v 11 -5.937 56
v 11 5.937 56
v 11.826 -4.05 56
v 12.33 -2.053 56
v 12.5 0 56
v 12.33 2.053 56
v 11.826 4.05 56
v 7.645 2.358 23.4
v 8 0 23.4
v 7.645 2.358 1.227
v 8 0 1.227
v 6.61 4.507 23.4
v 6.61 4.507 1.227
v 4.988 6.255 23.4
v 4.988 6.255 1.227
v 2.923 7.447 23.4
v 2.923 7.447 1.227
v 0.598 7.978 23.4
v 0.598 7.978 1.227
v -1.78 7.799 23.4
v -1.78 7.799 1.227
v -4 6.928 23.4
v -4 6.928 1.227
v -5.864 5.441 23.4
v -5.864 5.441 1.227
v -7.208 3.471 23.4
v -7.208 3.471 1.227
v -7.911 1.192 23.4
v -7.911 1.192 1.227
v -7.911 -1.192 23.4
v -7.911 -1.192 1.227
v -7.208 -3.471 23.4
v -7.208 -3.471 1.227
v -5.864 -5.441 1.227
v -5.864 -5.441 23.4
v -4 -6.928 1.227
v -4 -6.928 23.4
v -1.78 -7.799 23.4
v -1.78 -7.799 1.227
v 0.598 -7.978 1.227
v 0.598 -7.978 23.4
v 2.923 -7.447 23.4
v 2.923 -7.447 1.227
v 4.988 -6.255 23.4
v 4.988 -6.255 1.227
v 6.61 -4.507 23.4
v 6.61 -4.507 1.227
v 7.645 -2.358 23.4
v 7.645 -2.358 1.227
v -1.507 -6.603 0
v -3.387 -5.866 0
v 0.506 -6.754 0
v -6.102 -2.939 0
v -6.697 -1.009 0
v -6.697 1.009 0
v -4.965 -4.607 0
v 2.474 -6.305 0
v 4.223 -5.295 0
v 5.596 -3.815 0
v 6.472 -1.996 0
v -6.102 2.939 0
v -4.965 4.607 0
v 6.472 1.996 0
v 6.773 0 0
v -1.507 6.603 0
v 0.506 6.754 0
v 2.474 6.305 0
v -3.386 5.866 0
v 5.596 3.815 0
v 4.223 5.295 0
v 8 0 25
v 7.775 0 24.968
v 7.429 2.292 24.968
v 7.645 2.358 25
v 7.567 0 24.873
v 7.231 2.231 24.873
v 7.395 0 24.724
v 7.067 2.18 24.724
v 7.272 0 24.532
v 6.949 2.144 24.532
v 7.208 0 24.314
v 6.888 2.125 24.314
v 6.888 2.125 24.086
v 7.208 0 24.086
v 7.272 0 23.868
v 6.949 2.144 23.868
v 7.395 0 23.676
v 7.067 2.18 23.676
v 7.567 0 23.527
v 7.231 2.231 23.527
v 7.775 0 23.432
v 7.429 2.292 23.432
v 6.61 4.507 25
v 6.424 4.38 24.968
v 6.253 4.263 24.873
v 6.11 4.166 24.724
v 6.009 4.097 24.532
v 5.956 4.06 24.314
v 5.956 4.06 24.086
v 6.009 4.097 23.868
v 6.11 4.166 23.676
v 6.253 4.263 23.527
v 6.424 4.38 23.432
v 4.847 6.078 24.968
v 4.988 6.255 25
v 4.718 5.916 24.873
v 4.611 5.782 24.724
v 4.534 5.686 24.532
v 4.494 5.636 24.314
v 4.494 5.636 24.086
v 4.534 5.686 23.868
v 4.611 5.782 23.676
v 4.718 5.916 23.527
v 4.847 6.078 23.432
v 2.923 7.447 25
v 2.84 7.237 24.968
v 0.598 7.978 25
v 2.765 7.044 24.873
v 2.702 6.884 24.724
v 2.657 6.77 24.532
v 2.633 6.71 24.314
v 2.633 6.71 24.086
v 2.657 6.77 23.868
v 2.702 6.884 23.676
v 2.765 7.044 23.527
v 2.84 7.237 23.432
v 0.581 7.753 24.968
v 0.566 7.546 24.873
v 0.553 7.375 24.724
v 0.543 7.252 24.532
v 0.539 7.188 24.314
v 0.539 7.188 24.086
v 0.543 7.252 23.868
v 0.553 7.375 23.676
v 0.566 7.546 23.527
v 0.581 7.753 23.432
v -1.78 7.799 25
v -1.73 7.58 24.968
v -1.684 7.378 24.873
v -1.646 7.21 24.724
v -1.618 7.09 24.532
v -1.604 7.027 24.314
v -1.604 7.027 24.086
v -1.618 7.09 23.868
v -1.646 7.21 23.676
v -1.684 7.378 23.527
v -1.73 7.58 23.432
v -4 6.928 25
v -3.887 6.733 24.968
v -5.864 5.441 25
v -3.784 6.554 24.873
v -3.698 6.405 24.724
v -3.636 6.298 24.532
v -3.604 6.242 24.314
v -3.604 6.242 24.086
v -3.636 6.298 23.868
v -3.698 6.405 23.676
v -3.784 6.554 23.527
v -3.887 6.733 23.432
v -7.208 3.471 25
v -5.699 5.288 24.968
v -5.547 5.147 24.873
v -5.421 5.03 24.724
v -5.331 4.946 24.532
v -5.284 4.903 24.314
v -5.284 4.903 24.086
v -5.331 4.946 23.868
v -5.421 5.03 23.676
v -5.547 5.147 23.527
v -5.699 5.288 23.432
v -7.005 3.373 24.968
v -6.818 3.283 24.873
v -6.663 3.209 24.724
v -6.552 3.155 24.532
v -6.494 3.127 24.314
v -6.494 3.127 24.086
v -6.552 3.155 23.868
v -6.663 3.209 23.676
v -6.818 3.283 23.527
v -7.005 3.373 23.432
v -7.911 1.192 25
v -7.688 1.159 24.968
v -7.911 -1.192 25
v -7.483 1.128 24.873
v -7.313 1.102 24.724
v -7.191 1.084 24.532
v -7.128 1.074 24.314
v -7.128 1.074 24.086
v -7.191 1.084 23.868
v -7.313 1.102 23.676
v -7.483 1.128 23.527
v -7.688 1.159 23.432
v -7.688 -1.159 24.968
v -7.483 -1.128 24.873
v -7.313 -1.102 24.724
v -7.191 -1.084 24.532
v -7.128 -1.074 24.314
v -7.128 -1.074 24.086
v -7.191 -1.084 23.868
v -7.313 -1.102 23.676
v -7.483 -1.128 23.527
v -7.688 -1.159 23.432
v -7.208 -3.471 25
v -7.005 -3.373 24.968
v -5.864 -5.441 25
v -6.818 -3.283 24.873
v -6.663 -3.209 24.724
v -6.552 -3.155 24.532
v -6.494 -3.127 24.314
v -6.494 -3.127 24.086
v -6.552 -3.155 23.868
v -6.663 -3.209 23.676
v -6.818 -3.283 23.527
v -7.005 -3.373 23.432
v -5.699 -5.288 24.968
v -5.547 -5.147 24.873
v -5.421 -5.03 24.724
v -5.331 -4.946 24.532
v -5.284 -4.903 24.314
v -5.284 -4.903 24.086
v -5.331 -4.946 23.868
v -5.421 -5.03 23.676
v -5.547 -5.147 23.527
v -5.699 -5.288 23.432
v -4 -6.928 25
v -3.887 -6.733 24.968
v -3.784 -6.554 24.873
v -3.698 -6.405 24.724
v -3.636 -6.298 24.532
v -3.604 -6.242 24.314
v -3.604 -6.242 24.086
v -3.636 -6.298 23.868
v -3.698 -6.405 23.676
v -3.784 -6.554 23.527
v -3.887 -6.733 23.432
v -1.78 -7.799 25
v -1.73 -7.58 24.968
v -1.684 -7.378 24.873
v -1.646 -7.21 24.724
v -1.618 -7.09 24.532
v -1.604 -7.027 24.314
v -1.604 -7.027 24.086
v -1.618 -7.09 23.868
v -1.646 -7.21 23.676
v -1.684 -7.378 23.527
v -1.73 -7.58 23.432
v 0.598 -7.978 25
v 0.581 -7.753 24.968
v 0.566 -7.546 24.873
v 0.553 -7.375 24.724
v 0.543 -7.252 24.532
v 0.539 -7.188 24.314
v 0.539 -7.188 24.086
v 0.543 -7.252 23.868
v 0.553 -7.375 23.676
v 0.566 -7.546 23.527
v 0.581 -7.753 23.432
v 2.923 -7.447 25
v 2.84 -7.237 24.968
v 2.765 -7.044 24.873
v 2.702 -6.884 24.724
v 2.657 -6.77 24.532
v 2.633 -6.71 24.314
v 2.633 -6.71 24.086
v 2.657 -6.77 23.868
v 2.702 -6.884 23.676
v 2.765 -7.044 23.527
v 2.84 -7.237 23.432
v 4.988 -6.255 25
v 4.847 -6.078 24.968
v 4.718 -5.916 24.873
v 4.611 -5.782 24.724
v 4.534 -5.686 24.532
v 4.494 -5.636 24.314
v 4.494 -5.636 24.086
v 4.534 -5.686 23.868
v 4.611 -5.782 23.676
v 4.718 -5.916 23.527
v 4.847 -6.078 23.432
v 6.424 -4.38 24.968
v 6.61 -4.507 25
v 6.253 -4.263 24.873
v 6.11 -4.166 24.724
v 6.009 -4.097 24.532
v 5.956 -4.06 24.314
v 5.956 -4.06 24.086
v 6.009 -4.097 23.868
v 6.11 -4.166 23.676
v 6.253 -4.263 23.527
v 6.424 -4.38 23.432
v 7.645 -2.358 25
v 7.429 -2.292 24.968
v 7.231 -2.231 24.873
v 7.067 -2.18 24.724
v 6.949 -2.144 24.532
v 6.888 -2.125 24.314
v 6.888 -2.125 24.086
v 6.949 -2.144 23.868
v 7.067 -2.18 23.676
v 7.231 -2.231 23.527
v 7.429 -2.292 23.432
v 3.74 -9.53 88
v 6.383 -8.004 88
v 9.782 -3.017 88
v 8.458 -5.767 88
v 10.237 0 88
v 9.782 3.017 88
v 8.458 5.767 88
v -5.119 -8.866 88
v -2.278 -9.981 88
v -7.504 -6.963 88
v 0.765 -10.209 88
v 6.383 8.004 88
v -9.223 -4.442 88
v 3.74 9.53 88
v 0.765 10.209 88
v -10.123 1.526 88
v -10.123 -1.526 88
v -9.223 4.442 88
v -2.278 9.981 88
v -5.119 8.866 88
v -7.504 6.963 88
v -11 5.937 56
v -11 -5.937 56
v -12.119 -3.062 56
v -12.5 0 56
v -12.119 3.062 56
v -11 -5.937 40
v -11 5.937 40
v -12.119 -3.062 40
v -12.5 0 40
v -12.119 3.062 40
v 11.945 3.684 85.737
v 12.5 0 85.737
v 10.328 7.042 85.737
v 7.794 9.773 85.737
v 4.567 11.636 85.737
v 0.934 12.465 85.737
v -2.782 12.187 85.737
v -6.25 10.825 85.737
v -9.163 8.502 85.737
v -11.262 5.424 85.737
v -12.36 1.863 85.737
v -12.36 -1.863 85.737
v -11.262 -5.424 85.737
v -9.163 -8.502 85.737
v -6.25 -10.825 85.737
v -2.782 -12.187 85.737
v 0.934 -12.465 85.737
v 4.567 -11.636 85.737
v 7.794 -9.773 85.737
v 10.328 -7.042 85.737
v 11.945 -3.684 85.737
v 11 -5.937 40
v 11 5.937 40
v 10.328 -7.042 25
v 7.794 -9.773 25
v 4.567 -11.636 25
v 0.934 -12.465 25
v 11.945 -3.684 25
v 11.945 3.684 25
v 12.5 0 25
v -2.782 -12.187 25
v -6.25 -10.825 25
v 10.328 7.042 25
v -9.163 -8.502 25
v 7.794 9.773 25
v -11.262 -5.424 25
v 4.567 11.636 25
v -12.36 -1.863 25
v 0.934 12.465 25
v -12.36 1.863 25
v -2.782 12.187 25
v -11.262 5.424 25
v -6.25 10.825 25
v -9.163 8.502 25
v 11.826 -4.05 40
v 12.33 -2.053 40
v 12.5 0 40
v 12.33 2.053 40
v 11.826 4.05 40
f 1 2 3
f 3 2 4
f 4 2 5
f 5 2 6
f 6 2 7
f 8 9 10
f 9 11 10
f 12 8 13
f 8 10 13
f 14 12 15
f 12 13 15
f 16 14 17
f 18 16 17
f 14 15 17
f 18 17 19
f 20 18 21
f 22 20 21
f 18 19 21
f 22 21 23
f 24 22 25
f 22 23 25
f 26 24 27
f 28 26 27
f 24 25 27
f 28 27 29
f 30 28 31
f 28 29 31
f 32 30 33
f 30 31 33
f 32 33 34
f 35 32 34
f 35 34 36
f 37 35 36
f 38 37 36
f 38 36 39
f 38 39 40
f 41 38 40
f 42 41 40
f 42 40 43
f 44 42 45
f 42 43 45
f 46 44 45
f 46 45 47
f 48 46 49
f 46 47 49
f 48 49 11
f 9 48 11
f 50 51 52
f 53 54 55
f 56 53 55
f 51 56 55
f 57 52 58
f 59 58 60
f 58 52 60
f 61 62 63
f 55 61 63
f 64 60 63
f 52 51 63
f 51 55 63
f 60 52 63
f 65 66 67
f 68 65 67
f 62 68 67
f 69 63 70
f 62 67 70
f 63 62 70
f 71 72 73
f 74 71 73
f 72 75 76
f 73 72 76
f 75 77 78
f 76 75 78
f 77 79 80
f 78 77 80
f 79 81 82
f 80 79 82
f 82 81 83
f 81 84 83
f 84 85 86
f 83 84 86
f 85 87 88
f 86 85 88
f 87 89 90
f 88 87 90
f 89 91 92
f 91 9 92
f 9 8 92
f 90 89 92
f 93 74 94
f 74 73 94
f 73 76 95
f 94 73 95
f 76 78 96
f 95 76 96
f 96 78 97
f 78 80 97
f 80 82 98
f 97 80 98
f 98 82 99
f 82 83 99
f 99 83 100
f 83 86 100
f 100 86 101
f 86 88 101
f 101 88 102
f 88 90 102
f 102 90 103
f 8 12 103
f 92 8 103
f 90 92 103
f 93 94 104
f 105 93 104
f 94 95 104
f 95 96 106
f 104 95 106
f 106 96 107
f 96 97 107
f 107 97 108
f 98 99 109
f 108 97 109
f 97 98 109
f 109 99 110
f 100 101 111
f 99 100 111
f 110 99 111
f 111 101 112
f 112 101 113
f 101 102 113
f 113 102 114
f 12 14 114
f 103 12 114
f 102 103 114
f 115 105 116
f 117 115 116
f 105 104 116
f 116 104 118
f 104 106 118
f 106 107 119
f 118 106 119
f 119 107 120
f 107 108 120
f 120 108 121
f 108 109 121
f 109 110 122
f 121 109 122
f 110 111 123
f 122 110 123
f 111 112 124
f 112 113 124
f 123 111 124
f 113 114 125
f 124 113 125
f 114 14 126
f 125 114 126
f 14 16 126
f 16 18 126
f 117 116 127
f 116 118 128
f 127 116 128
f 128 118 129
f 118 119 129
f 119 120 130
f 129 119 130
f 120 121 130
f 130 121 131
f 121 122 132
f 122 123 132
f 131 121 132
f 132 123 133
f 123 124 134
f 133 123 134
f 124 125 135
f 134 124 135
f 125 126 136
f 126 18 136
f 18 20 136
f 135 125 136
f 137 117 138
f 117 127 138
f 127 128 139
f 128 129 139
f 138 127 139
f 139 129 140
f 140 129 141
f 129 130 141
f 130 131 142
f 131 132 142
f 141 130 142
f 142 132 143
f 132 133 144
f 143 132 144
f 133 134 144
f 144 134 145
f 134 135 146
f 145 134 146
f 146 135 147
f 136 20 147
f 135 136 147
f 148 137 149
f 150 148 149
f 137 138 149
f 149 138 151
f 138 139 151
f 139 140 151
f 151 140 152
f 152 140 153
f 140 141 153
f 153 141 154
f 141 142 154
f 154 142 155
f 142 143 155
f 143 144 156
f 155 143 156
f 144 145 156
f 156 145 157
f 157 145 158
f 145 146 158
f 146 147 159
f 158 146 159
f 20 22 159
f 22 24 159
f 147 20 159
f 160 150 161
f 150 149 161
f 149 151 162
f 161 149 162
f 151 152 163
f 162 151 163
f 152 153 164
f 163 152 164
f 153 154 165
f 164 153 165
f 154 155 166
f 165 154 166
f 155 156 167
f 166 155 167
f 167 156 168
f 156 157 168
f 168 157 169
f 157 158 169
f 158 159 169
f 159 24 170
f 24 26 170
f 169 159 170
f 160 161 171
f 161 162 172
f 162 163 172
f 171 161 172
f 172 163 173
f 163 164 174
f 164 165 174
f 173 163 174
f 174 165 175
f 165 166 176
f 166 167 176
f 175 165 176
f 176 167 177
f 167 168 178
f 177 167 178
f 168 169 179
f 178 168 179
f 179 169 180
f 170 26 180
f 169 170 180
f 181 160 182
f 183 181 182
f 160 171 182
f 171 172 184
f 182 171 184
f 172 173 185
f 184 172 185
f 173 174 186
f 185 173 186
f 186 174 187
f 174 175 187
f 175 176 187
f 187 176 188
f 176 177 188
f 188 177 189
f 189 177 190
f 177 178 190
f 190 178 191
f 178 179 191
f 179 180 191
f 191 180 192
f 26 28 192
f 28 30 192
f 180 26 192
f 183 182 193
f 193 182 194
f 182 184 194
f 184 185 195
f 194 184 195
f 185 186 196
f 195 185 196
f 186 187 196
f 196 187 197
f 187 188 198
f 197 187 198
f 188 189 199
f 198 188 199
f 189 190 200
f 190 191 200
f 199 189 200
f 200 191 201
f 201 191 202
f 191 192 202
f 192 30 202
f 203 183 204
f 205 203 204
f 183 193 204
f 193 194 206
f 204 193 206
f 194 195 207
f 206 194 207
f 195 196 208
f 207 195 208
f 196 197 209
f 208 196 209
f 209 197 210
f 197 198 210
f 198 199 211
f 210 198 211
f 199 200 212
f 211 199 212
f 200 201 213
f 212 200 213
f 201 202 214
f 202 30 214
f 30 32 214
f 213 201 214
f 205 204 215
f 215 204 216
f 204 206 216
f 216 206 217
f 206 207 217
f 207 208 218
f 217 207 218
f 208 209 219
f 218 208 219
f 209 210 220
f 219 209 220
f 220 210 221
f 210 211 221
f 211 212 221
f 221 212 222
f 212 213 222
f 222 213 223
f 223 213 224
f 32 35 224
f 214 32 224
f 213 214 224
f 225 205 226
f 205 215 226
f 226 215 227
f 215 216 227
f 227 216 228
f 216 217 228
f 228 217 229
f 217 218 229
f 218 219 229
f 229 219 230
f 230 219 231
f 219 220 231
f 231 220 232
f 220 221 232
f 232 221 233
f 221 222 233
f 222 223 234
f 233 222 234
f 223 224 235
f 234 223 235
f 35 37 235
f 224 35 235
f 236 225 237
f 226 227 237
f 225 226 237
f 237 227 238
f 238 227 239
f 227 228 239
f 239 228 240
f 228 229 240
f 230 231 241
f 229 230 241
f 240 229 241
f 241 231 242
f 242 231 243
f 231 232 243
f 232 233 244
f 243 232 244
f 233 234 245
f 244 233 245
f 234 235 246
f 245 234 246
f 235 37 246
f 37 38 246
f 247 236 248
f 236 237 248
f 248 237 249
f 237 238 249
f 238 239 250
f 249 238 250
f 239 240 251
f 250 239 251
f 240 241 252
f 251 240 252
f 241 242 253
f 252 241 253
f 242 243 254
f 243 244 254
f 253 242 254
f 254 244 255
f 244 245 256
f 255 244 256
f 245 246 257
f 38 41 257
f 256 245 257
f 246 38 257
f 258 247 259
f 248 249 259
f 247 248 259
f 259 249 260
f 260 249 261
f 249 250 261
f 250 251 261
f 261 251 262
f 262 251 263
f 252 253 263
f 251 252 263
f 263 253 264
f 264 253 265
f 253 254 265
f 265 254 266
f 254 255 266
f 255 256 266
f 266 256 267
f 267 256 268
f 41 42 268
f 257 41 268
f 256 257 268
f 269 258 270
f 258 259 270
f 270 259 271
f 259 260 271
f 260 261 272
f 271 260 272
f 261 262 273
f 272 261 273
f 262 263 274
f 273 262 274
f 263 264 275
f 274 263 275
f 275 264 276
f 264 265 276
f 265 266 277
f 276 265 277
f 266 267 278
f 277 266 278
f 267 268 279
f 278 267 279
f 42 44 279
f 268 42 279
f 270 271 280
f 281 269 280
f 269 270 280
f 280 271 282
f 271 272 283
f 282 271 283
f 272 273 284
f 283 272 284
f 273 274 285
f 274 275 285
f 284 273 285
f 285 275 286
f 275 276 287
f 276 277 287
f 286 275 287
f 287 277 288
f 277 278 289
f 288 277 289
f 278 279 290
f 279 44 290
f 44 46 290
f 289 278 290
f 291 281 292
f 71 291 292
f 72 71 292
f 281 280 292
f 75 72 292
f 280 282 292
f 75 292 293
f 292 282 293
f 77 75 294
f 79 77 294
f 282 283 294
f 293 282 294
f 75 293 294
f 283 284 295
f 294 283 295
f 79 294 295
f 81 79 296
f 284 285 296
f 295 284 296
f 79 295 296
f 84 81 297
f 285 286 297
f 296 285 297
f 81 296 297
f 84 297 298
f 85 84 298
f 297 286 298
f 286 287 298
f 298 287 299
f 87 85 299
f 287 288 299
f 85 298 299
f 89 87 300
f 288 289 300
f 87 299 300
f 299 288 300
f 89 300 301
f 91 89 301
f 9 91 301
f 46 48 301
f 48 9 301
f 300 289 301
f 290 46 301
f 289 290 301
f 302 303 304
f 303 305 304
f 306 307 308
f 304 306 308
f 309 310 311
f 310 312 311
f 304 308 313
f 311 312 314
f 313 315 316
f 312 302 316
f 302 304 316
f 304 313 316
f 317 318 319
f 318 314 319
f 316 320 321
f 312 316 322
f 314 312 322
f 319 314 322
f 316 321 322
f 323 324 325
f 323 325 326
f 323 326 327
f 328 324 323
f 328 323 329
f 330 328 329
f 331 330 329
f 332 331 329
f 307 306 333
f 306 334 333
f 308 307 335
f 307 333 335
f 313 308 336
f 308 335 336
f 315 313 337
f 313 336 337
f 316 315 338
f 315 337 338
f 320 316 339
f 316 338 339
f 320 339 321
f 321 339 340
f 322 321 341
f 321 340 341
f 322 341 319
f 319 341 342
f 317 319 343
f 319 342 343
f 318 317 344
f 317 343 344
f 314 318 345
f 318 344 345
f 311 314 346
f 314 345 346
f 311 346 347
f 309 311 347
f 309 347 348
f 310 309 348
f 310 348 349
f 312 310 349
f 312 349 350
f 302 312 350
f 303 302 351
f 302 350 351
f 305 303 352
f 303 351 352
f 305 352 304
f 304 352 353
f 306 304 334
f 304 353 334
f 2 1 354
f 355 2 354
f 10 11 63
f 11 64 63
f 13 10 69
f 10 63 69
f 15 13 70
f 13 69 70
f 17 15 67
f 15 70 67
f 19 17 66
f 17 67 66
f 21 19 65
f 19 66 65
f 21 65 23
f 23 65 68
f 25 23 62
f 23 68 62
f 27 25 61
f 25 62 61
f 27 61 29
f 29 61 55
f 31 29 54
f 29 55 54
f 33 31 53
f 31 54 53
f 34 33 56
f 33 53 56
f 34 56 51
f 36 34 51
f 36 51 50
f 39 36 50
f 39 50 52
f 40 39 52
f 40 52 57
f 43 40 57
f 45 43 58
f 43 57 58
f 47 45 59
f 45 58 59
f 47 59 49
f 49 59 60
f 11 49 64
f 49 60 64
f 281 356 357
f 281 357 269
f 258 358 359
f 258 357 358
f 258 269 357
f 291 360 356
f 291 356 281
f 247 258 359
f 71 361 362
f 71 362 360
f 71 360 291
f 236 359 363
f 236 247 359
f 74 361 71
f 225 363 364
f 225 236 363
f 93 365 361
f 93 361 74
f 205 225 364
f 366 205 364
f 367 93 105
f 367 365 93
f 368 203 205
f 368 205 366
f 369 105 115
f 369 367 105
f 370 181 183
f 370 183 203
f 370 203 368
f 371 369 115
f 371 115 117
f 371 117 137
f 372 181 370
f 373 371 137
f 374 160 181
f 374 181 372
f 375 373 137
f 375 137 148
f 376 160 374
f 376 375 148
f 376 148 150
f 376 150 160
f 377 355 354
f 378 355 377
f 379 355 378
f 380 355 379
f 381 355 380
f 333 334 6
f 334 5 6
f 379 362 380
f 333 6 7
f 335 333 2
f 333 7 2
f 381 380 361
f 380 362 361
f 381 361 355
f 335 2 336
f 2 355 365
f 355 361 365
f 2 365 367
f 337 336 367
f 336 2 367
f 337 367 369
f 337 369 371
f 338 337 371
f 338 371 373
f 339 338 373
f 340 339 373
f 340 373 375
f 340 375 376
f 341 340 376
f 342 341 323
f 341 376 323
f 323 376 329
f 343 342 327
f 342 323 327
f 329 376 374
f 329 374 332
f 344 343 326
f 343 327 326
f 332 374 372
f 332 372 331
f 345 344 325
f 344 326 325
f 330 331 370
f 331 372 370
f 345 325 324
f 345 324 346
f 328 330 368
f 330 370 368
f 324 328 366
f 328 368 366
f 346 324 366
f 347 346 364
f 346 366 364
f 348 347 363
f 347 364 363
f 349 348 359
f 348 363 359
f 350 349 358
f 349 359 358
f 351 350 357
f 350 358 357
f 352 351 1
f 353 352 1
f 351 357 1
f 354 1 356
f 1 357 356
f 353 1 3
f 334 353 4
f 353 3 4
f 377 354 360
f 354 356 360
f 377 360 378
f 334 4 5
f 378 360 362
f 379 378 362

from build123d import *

# Parameters (mm, degrees)
SZKIC4_W                        = 63
SZKIC4_H                        = 12.5
WYTNIJ_WYCI_GNI_CIE1_DEPTH      = 12.5
WYTNIJ_WYCI_GNI_CIE1_DEPTH_BACK = 12.5
SZKIC1_W                        = 4
SZKIC1_H                        = 16
WYTNIJ_WYCI_GNI_CIE2_DEPTH      = 12.5
WYTNIJ_WYCI_GNI_CIE2_DEPTH_BACK = 12.5
SZKIC2_W                        = 4
SZKIC2_H                        = 16


with BuildPart() as part:
    # Szkic3 → Obrót1 (revolve)
    with BuildSketch(Plane(origin=(0, 0, 0), x_dir=(0, 0, -1), z_dir=(1, 0, 0))):
        Polygon((-25, 0), (-25, 8), (-1.227, 8), (0, 6.773), (0, 0), align=None)
    revolve(axis=Axis((0, 0, 0), (0, 0, 1)))

    # Szkic4 → Obrót2 (revolve)
    with BuildSketch(Plane(origin=(0, 0, 0), x_dir=(0, 0, -1), z_dir=(1, 0, 0))):
        with Locations((-56.5, 6.25)):
            Rectangle(SZKIC4_W, SZKIC4_H)
    revolve(axis=Axis((0, 0, 25), (0, 0, 1)))

    # Szkic5 → Wycięcie-obrót1 (revolve, cut)
    with BuildSketch(Plane(origin=(0, 0, 0), x_dir=(0, 0, -1), z_dir=(1, 0, 0))):
        Polygon((-88, 10.2372583), (-85.7372583, 12.5), (-88, 12.5), align=None)
    revolve(axis=Axis((0, 0, 25), (0, 0, 1)), mode=Mode.SUBTRACT)

    # Szkic6 → Wycięcie-obrót2 (revolve, cut)
    with BuildSketch(Plane(origin=(0, 0, 0), x_dir=(0, 0, -1), z_dir=(1, 0, 0))):
        with BuildLine():
            Line((-23.4, 8), (-25, 8))
            ThreePointArc((-25, 8), (-24.2, 7.2), (-23.4, 8))
        make_face()
    revolve(axis=Axis((0, 0, 0), (0, 0, 1)), mode=Mode.SUBTRACT)

    # Szkic1 → Wytnij-wyciągnięcie1 (cut, two sides: drawn at the far end of the back side and taken through both)
    with BuildSketch(Plane(origin=(0, 0, 0), x_dir=(1, 0, 0), z_dir=(0, 1, 0)).offset(-WYTNIJ_WYCI_GNI_CIE1_DEPTH_BACK)):
        with Locations((13, -48)):
            Rectangle(SZKIC1_W, SZKIC1_H)
    extrude(amount=WYTNIJ_WYCI_GNI_CIE1_DEPTH + WYTNIJ_WYCI_GNI_CIE1_DEPTH_BACK, mode=Mode.SUBTRACT)

    # Szkic2 → Wytnij-wyciągnięcie2 (cut, two sides: drawn at the far end of the back side and taken through both)
    with BuildSketch(Plane(origin=(0, 0, 0), x_dir=(1, 0, 0), z_dir=(0, 1, 0)).offset(-WYTNIJ_WYCI_GNI_CIE2_DEPTH_BACK)):
        with Locations((-13, -48)):
            Rectangle(SZKIC2_W, SZKIC2_H)
    extrude(amount=WYTNIJ_WYCI_GNI_CIE2_DEPTH + WYTNIJ_WYCI_GNI_CIE2_DEPTH_BACK, mode=Mode.SUBTRACT)


solid = part.part
